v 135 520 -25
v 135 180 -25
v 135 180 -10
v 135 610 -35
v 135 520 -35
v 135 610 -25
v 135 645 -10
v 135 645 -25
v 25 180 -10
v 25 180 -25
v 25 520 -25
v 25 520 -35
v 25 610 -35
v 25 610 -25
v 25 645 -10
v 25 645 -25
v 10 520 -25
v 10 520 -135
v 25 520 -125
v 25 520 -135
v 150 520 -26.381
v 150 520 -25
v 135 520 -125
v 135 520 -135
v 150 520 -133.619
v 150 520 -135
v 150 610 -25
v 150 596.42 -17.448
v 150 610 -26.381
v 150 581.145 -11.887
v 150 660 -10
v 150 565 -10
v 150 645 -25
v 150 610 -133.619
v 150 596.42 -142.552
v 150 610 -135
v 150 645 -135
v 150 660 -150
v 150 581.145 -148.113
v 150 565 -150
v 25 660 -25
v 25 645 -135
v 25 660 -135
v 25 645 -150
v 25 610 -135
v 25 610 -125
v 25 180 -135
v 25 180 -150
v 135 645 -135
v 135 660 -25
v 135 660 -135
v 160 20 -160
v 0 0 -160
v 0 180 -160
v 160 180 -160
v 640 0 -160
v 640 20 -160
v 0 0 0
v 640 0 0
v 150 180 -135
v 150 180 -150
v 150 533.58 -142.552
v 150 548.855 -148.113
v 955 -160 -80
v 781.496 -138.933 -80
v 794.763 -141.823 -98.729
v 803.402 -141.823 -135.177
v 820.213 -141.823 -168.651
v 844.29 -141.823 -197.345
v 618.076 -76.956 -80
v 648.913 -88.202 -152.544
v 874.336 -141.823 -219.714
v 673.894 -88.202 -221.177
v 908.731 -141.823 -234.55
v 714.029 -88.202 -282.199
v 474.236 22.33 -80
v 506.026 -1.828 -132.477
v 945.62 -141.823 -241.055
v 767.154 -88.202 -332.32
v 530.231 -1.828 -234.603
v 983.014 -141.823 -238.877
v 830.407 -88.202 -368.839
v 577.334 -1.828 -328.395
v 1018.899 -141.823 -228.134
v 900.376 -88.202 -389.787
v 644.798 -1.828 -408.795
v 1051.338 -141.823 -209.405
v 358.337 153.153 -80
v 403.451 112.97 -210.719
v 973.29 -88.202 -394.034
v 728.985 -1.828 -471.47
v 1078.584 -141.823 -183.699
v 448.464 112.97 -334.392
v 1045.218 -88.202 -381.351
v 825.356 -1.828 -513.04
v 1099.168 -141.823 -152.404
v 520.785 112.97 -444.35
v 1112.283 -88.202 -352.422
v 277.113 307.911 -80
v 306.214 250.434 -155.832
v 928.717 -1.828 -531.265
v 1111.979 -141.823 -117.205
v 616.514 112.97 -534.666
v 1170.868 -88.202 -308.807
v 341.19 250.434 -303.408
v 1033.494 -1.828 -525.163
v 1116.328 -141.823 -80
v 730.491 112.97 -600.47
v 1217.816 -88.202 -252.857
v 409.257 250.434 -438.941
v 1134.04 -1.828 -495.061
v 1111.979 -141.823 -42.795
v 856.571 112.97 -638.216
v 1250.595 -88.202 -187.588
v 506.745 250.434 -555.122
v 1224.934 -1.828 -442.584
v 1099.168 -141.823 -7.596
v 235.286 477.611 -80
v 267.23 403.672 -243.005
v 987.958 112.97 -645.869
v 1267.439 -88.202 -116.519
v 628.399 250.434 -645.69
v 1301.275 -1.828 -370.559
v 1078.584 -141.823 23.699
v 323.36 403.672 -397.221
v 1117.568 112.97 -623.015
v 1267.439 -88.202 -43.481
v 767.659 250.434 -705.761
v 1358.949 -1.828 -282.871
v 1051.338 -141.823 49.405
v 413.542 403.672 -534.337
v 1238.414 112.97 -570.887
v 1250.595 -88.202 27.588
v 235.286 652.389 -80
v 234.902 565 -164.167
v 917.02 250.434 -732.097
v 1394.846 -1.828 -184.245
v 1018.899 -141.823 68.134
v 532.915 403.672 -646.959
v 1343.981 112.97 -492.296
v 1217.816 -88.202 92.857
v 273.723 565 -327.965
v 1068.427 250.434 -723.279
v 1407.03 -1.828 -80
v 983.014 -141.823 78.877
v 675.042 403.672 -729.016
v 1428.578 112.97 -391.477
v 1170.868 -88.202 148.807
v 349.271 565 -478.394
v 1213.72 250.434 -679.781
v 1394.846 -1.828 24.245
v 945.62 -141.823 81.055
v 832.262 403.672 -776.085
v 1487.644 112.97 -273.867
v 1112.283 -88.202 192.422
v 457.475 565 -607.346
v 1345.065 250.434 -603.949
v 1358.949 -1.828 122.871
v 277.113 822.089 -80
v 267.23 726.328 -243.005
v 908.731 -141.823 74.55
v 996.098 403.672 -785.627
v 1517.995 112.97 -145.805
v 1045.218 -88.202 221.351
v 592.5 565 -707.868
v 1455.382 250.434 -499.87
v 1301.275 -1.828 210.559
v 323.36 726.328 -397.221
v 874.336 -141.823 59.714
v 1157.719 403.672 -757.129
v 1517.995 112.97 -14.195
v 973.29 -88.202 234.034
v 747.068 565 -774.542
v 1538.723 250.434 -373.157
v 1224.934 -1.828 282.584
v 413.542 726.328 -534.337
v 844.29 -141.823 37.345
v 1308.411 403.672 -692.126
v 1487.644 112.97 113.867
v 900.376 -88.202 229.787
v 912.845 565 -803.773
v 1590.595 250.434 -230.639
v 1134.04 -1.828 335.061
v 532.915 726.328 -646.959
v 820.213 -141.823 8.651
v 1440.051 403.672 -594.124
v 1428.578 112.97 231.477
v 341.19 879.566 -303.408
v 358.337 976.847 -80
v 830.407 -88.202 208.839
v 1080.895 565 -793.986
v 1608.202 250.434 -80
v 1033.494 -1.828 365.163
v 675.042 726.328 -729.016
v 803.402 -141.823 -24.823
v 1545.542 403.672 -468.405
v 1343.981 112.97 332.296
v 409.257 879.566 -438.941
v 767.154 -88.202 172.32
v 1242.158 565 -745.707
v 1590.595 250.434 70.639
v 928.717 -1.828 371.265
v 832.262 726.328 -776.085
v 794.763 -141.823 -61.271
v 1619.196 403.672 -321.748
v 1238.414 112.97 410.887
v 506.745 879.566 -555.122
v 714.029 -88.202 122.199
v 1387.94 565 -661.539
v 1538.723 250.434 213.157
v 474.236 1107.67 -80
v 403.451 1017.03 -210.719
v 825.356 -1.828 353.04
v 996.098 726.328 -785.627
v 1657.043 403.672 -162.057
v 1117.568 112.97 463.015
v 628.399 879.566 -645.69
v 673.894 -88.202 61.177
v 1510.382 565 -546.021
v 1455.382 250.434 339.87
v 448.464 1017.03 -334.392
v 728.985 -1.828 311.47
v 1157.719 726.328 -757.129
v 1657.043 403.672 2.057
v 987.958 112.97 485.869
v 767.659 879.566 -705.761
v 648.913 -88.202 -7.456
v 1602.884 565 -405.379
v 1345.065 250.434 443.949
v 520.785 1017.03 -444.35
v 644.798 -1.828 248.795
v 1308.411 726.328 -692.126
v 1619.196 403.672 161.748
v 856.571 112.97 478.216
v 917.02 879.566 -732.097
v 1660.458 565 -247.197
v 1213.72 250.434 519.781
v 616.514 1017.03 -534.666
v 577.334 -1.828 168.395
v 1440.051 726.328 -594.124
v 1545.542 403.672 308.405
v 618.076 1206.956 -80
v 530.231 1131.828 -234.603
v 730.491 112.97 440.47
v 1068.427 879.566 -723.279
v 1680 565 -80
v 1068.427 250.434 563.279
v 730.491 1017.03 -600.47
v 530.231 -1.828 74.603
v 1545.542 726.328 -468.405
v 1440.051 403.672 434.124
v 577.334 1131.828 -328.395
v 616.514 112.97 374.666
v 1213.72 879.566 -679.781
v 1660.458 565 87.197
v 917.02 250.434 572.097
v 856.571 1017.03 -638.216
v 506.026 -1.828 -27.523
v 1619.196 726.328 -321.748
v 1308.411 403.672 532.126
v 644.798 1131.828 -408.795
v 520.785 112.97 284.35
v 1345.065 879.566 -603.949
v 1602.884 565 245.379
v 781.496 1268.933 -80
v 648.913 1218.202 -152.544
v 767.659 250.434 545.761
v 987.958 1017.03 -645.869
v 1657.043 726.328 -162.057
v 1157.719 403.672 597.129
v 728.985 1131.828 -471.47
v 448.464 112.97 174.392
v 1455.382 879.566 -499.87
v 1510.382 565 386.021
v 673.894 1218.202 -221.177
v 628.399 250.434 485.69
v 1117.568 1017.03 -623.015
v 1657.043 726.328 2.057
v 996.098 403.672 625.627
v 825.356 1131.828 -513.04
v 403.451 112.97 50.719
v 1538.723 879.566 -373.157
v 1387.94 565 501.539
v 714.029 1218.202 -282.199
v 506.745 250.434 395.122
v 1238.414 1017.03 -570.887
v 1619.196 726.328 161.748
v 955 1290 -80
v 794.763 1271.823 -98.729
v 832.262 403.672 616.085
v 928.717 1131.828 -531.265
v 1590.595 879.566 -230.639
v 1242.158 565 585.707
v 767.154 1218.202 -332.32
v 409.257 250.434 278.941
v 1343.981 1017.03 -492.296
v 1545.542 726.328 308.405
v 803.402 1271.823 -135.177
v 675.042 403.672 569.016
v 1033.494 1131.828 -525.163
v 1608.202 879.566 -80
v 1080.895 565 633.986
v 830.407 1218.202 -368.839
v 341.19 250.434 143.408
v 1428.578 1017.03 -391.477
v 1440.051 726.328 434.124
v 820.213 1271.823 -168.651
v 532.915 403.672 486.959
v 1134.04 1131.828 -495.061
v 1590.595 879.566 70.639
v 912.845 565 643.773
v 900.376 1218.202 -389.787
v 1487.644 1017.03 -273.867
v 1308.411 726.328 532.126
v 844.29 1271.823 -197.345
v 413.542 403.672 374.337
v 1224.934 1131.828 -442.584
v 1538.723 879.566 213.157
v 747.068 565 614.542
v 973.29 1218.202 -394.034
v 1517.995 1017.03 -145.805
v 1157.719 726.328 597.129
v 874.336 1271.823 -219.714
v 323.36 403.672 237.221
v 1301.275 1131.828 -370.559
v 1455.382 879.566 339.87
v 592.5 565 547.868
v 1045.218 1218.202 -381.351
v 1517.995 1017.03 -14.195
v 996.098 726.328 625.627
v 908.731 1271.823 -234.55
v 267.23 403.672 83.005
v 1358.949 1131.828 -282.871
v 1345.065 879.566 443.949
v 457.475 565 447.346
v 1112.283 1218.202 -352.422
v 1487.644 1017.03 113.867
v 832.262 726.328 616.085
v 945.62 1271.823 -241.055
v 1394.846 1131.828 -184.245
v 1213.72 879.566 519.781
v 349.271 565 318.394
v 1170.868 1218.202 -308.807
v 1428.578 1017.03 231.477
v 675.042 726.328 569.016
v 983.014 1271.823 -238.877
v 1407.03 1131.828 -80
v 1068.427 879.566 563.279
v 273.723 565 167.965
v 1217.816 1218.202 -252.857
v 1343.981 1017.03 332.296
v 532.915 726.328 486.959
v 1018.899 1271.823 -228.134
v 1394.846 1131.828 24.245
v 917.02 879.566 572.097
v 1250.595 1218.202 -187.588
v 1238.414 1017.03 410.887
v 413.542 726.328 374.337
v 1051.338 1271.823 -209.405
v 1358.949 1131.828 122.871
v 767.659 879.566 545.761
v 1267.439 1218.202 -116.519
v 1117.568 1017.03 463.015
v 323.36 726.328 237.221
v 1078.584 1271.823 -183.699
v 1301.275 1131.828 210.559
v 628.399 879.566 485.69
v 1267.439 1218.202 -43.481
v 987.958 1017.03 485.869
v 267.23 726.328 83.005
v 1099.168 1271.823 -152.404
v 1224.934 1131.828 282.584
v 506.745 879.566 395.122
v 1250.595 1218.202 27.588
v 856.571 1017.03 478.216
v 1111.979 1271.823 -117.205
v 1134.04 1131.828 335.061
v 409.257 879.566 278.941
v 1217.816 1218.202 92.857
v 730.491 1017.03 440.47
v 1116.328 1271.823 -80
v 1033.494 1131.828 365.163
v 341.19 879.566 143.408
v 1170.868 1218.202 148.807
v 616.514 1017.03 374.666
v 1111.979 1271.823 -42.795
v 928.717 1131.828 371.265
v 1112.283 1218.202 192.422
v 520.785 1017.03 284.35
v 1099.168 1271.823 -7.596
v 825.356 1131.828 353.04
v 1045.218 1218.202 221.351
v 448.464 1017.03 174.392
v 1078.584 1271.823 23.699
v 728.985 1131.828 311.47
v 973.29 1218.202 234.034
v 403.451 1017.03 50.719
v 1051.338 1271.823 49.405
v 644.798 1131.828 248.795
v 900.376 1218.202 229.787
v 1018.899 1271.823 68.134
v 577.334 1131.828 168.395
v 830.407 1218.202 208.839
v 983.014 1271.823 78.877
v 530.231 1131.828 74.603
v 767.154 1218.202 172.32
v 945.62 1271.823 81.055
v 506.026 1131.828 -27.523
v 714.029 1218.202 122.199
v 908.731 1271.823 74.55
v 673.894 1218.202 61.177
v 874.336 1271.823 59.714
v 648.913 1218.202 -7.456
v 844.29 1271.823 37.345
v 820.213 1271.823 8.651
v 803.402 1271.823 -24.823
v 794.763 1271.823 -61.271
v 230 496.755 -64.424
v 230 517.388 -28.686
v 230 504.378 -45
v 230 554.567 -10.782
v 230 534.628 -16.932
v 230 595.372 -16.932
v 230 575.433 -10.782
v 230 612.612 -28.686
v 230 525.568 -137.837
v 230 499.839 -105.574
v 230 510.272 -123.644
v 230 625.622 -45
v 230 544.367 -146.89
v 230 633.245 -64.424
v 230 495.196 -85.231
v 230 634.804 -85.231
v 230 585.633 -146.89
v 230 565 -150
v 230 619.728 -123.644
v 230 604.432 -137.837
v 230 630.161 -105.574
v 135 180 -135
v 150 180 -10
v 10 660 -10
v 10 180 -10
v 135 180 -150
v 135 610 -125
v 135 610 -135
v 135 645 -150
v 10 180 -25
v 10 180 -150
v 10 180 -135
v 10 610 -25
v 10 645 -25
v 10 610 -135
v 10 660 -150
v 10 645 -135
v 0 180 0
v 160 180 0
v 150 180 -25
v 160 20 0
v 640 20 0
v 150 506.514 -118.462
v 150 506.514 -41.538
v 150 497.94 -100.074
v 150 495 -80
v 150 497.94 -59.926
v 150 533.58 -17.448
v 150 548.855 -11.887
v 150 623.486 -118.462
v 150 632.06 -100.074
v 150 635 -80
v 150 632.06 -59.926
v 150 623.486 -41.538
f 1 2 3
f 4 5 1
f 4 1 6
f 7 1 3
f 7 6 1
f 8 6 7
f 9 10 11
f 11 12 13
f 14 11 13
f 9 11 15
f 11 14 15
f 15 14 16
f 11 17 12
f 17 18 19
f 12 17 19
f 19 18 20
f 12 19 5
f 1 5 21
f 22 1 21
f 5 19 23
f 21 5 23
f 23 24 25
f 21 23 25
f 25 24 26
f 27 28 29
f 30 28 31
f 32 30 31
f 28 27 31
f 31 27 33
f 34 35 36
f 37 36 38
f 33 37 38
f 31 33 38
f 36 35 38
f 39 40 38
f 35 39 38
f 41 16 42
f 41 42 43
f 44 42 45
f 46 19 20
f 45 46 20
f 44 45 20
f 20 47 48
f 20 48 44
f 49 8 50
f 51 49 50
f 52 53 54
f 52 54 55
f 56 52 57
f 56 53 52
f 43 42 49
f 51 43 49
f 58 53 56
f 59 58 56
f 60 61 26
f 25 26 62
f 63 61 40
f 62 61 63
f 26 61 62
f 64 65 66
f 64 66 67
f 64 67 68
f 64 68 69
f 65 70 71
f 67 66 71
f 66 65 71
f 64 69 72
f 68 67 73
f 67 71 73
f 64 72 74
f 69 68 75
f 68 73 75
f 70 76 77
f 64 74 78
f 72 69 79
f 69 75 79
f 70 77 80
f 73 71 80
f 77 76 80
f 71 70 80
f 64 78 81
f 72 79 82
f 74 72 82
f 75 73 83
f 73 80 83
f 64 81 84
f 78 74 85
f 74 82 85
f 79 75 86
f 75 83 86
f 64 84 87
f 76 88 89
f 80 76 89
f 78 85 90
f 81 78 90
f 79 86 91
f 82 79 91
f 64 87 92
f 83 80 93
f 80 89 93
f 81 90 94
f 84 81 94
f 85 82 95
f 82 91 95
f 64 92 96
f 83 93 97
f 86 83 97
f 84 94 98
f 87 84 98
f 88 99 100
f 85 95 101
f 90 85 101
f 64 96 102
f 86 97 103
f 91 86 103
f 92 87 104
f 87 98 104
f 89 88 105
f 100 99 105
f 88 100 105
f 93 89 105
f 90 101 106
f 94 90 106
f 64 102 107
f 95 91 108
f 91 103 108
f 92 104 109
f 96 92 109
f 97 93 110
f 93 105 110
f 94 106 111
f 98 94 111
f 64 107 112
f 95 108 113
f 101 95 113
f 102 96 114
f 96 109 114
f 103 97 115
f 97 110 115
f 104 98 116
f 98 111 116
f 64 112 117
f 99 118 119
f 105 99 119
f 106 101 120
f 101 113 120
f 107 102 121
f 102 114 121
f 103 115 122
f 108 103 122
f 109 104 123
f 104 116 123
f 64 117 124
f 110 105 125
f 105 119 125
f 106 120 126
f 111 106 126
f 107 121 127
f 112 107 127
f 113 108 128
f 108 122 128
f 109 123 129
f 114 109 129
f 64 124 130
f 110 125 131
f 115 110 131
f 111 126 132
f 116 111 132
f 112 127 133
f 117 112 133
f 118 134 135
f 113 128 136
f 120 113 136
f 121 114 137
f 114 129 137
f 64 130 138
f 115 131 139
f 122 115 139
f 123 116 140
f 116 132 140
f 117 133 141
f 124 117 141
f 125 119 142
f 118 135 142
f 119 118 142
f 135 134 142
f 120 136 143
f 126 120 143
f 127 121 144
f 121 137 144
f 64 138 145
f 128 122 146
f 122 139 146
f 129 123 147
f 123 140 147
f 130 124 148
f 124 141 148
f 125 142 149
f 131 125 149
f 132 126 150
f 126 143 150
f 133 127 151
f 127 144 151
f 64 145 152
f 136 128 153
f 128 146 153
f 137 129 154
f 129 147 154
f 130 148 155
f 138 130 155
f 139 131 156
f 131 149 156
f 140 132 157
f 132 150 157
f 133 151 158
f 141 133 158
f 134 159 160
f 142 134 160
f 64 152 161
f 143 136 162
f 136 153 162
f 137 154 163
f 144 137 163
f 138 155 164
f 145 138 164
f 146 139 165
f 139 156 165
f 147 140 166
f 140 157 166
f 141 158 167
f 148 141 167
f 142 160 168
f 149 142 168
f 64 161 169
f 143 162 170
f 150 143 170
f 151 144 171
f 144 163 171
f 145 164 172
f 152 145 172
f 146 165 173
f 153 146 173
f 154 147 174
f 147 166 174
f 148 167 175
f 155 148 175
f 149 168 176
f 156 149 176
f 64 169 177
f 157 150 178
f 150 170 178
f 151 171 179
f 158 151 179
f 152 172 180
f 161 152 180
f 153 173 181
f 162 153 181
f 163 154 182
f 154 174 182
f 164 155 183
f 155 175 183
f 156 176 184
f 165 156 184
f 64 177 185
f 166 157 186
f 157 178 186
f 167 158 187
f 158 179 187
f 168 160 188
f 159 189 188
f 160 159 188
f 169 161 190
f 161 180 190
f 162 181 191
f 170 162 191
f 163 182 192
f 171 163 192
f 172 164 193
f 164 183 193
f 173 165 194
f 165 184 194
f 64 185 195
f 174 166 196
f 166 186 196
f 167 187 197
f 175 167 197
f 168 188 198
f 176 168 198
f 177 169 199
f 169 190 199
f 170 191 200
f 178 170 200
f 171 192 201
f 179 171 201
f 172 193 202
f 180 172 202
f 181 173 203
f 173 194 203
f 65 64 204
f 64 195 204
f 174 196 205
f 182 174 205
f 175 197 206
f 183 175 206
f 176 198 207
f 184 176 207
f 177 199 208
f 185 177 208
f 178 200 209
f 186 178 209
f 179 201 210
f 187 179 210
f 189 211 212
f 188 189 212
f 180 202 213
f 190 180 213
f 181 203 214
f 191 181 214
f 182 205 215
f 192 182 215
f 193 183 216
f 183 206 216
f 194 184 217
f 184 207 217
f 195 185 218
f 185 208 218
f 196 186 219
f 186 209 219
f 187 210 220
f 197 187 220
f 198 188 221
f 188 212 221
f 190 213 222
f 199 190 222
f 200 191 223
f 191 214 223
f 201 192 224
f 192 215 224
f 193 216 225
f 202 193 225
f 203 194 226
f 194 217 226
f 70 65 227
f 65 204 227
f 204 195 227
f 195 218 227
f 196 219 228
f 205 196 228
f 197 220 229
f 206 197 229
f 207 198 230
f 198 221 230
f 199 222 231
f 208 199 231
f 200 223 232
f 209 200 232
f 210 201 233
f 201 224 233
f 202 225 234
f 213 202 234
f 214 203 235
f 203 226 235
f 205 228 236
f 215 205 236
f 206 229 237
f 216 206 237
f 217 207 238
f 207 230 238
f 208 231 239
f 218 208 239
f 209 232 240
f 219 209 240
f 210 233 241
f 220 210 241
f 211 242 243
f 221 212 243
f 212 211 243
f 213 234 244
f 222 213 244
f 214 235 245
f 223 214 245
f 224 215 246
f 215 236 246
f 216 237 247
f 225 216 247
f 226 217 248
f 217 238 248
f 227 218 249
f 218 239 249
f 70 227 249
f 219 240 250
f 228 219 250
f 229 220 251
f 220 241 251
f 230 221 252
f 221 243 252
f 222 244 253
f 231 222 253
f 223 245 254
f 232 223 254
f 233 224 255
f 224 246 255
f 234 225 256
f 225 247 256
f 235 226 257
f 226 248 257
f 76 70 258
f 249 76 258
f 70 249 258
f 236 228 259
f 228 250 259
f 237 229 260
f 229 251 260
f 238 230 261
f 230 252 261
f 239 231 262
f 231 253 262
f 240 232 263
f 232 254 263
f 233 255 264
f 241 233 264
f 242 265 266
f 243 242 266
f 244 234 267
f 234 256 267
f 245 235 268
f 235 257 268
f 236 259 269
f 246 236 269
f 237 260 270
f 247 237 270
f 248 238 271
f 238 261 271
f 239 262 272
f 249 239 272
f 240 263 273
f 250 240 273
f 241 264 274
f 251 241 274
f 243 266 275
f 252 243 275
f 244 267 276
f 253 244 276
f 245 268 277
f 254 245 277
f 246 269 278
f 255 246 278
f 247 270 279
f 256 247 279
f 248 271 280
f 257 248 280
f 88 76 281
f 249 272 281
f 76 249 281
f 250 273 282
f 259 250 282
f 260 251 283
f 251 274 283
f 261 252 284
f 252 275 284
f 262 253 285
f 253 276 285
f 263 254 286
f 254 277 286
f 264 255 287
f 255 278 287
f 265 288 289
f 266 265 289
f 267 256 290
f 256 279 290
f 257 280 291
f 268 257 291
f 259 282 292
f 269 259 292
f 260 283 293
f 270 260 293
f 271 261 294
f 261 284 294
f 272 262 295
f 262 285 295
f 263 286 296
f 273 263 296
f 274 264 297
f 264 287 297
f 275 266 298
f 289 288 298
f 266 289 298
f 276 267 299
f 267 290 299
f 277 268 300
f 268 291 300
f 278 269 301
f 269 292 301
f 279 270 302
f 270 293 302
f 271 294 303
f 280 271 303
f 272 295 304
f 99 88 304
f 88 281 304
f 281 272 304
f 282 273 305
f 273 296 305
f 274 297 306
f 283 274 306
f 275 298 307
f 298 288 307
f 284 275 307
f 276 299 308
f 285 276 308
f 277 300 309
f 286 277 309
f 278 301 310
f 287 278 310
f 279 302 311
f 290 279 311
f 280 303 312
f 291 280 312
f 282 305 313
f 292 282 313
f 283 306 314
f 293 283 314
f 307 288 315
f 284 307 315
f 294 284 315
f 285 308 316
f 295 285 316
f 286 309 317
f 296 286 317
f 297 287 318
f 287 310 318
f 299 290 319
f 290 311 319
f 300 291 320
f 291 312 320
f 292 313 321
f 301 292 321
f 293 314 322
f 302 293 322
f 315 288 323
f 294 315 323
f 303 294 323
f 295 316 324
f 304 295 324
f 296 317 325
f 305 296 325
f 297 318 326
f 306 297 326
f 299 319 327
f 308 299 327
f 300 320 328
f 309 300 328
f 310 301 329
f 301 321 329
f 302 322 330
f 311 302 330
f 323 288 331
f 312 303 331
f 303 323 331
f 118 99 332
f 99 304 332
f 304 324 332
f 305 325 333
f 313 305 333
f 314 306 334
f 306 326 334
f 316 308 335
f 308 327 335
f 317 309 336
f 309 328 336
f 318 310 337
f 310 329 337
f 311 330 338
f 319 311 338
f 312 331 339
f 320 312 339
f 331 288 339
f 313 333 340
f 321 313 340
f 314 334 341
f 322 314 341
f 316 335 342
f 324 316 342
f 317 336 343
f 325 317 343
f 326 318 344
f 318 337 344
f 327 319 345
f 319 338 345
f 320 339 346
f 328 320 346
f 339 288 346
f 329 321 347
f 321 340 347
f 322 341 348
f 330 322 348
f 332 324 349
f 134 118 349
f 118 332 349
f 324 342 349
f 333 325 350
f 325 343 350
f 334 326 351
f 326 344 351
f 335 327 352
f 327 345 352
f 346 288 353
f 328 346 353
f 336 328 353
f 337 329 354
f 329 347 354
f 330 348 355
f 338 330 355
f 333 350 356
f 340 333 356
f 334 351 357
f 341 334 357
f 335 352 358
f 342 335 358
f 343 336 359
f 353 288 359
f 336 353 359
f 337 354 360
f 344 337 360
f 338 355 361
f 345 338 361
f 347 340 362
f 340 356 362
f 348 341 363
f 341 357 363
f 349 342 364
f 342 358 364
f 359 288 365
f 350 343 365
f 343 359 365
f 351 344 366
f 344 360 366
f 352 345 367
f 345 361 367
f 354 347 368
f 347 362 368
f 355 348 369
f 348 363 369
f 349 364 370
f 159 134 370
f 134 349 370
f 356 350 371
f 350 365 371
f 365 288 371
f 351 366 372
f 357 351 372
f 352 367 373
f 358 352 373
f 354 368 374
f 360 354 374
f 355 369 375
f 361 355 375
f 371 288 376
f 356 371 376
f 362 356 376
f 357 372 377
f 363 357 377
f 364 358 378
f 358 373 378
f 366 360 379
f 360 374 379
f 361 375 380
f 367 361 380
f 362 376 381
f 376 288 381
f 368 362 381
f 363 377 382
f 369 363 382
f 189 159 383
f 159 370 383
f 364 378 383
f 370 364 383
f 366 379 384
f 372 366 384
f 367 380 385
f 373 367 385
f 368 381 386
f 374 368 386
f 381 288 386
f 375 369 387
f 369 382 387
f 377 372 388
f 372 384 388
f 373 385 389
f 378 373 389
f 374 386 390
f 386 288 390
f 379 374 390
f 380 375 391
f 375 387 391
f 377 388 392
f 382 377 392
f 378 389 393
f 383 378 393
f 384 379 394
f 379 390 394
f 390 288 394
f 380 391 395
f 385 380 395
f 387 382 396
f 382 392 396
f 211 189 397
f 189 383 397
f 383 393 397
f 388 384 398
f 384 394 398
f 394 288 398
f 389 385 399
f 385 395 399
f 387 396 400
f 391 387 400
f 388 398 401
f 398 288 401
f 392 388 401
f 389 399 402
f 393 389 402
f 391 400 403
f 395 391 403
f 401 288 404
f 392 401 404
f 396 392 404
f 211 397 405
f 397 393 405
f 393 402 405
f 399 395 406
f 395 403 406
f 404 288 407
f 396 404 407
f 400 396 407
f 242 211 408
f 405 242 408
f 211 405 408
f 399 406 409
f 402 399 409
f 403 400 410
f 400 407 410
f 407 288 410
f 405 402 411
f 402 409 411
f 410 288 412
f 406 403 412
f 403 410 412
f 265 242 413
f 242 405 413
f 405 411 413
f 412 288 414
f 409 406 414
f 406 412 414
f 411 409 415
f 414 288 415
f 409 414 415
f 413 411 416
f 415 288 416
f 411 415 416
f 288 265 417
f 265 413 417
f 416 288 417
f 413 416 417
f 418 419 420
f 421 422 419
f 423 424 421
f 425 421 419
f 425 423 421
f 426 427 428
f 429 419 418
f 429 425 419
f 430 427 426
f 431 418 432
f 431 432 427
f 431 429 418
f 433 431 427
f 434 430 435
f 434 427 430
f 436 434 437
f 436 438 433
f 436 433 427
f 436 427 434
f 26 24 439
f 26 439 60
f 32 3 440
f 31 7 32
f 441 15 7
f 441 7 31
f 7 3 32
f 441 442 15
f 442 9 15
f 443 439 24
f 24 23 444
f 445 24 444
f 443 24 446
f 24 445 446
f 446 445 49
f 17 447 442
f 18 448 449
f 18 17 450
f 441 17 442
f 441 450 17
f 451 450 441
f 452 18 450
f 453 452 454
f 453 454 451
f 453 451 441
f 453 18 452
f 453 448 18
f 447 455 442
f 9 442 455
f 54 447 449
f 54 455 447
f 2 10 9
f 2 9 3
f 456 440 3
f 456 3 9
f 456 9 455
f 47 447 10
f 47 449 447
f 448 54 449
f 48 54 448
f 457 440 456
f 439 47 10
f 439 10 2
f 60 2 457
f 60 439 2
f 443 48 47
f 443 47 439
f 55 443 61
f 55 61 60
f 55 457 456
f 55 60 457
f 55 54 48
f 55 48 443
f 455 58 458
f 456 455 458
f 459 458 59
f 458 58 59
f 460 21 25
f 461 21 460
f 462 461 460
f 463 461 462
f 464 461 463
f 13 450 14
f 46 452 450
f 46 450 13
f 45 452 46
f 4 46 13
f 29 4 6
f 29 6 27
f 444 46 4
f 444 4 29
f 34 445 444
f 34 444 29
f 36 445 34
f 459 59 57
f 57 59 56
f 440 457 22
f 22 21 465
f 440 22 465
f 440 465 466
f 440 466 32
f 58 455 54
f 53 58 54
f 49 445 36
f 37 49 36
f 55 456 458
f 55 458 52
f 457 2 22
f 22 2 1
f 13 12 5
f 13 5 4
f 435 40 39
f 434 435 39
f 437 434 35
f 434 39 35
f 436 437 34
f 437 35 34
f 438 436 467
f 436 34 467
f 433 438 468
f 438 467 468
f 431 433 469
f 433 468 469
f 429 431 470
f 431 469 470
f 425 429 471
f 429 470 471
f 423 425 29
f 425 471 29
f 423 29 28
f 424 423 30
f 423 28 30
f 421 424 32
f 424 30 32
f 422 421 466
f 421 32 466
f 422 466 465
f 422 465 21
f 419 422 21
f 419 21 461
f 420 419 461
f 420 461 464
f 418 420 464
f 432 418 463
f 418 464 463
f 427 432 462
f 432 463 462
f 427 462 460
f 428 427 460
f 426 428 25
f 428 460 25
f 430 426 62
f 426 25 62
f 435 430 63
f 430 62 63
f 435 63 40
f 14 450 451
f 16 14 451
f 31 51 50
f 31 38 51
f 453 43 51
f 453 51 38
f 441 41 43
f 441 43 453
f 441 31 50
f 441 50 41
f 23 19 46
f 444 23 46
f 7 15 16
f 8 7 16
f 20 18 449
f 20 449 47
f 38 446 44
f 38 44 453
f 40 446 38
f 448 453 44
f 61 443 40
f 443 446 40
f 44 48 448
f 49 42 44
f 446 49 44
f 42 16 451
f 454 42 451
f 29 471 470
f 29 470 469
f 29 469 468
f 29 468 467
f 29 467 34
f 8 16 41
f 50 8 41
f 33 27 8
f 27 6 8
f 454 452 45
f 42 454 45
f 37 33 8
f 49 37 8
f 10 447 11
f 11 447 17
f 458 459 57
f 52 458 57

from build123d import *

# Parameters (mm, degrees)
SKETCH1_W                       = 640
SKETCH1_H                       = 160
BOSS_EXTRUDE1_DEPTH             = 180
SKETCH2_W                       = 160
SKETCH2_H                       = 160
CUT_EXTRUDE1_DEPTH              = 480
SKETCH5_W                       = 15
SKETCH5_H                       = 15
BOSS_EXTRUDE2_DEPTH             = 480
SKETCH6_W                       = 15
SKETCH6_H                       = 15
BOSS_EXTRUDE3_DEPTH             = 110
SKETCH7_W                       = 15
SKETCH7_H                       = 15
BOSS_EXTRUDE4_DEPTH             = 110
SKETCH9_W                       = 90
SKETCH9_H                       = 90
BOSS_EXTRUDE5_DEPTH             = 140
BOSS_EXTRUDE6_REACH             = 929.807
SKETCH10_W                      = 15
SKETCH10_H                      = 90
BOSS_EXTRUDE6_DIRECTION_2_REACH = 929.807
SKETCH8_R                       = 70
BOSS_EXTRUDE7_DEPTH             = 80


with BuildPart() as part:
    # Sketch1 → Boss-Extrude1 (new body)
    with BuildSketch(Plane(origin=(0, 0, 0), x_dir=(1, 0, 0), z_dir=(0, 1, 0))):
        with Locations((320, 80)):
            Rectangle(SKETCH1_W, SKETCH1_H)
    extrude(amount=BOSS_EXTRUDE1_DEPTH)

    # Sketch2 → Cut-Extrude1 (cut)
    with BuildSketch(Plane(origin=(640, 0, 0), x_dir=(0, 0, -1), z_dir=(1, 0, 0))):
        with Locations((80, 100)):
            Rectangle(SKETCH2_W, SKETCH2_H)
    extrude(amount=-CUT_EXTRUDE1_DEPTH, mode=Mode.SUBTRACT)

    # Sketch5 → Boss-Extrude2 (add)
    with BuildSketch(Plane(origin=(0, 180, 0), x_dir=(1, 0, 0), z_dir=(0, 1, 0))):
        with Locations((17.5, 142.5)):
            Rectangle(SKETCH5_W, SKETCH5_H)
        with Locations((142.5, 142.5)):
            Rectangle(SKETCH5_W, SKETCH5_H)
        with Locations((142.5, 17.5)):
            Rectangle(SKETCH5_W, SKETCH5_H)
        with Locations((17.5, 17.5)):
            Rectangle(SKETCH5_W, SKETCH5_H)
    extrude(amount=BOSS_EXTRUDE2_DEPTH)

    # Sketch6 → Boss-Extrude3 (add)
    with BuildSketch(Plane(origin=(25, 0, 0), x_dir=(0, 0, -1), z_dir=(1, 0, 0))):
        with Locations((17.5, 652.5)):
            Rectangle(SKETCH6_W, SKETCH6_H)
        with Locations((142.5, 652.5)):
            Rectangle(SKETCH6_W, SKETCH6_H)
    extrude(amount=BOSS_EXTRUDE3_DEPTH)

    # Sketch7 → Boss-Extrude4 (add)
    with BuildSketch(Plane(origin=(0, 0, -25), x_dir=(-1, 0, 0), z_dir=(0, 0, -1))):
        with Locations((-142.5, 652.5)):
            Rectangle(SKETCH7_W, SKETCH7_H)
        with Locations((-17.5, 652.5)):
            Rectangle(SKETCH7_W, SKETCH7_H)
    extrude(amount=BOSS_EXTRUDE4_DEPTH)

    # Boss-Extrude6: up to this face of the body (flat: up to its plane)
    boss_extrude6_end = Plane(part.part.faces().sort_by_distance((17.5, 412.5, -25))[0])
    # Sketch10 → Boss-Extrude6 (add, up to the picked face)
    with BuildSketch(Plane.XY.offset(-35), mode=Mode.PRIVATE) as boss_extrude6_sk1:
        with Locations((17.5, 565)):
            Rectangle(SKETCH10_W, SKETCH10_H)
    boss_extrude6_tool1 = split(extrude(boss_extrude6_sk1.sketch, amount=BOSS_EXTRUDE6_REACH, mode=Mode.PRIVATE), bisect_by=boss_extrude6_end, keep=Keep.BOTH, mode=Mode.PRIVATE)
    # Sketch10 → Boss-Extrude6 (add, up to the picked face)
    with BuildSketch(Plane.XY.offset(-35), mode=Mode.PRIVATE) as boss_extrude6_sk2:
        with Locations((142.5, 565)):
            Rectangle(SKETCH10_W, SKETCH10_H)
    boss_extrude6_tool2 = split(extrude(boss_extrude6_sk2.sketch, amount=BOSS_EXTRUDE6_REACH, mode=Mode.PRIVATE), bisect_by=boss_extrude6_end, keep=Keep.BOTH, mode=Mode.PRIVATE)


with BuildPart() as body_2:
    # Sketch9 → Boss-Extrude5 (new body)
    with BuildSketch(Plane(origin=(150, 0, 0), x_dir=(0, 0, -1), z_dir=(1, 0, 0))):
        with Locations((80, 565)):
            Rectangle(SKETCH9_W, SKETCH9_H)
    extrude(amount=-BOSS_EXTRUDE5_DEPTH)


with BuildPart() as part_1:
    add(part.part)

    add(body_2.part)  # Boss-Extrude6 merges body 2
    add(boss_extrude6_tool1.solids().sort_by(Axis((17.5, 565, -35), (0, 0, 1)))[0])
    add(boss_extrude6_tool2.solids().sort_by(Axis((142.5, 565, -35), (0, 0, 1)))[0])

    # Boss-Extrude6 direction 2: up to this face of the body (flat: up to its plane)
    boss_extrude6_direction_2_end = Plane(part_1.part.faces().sort_by_distance((17.5, 412.5, -135))[0])
    # Sketch10 → Boss-Extrude6 direction 2 (add, up to the picked face)
    with BuildSketch(Plane.XY.offset(-35), mode=Mode.PRIVATE) as boss_extrude6_direction_2_sk1:
        with Locations((17.5, 565)):
            Rectangle(SKETCH10_W, SKETCH10_H)
    boss_extrude6_direction_2_tool1 = split(extrude(boss_extrude6_direction_2_sk1.sketch, amount=-BOSS_EXTRUDE6_DIRECTION_2_REACH, mode=Mode.PRIVATE), bisect_by=boss_extrude6_direction_2_end, keep=Keep.BOTH, mode=Mode.PRIVATE)
    # Sketch10 → Boss-Extrude6 direction 2 (add, up to the picked face)
    with BuildSketch(Plane.XY.offset(-35), mode=Mode.PRIVATE) as boss_extrude6_direction_2_sk2:
        with Locations((142.5, 565)):
            Rectangle(SKETCH10_W, SKETCH10_H)
    boss_extrude6_direction_2_tool2 = split(extrude(boss_extrude6_direction_2_sk2.sketch, amount=-BOSS_EXTRUDE6_DIRECTION_2_REACH, mode=Mode.PRIVATE), bisect_by=boss_extrude6_direction_2_end, keep=Keep.BOTH, mode=Mode.PRIVATE)
    add(boss_extrude6_direction_2_tool1.solids().sort_by(Axis((17.5, 565, -35), (0, 0, -1)))[0])
    add(boss_extrude6_direction_2_tool2.solids().sort_by(Axis((142.5, 565, -35), (0, 0, -1)))[0])

    # Sketch8 → Boss-Extrude7 (add)
    with BuildSketch(Plane(origin=(150, 0, 0), x_dir=(0, 0, -1), z_dir=(1, 0, 0))):
        with Locations((80, 565)):
            Circle(SKETCH8_R)
    extrude(amount=BOSS_EXTRUDE7_DEPTH)


with BuildPart() as body_2_2:
    # Sketch11 → Revolve1 (revolve)
    with BuildSketch(Plane.XY.offset(-80)):
        with BuildLine():
            Line((955, 1290), (955, -160))
            ThreePointArc((955, -160), (230, 565), (955, 1290))
        make_face()
    revolve(axis=Axis((955, 1290, -80), (0, -1, 0)))


solid = Compound([part_1.part, body_2_2.part])
